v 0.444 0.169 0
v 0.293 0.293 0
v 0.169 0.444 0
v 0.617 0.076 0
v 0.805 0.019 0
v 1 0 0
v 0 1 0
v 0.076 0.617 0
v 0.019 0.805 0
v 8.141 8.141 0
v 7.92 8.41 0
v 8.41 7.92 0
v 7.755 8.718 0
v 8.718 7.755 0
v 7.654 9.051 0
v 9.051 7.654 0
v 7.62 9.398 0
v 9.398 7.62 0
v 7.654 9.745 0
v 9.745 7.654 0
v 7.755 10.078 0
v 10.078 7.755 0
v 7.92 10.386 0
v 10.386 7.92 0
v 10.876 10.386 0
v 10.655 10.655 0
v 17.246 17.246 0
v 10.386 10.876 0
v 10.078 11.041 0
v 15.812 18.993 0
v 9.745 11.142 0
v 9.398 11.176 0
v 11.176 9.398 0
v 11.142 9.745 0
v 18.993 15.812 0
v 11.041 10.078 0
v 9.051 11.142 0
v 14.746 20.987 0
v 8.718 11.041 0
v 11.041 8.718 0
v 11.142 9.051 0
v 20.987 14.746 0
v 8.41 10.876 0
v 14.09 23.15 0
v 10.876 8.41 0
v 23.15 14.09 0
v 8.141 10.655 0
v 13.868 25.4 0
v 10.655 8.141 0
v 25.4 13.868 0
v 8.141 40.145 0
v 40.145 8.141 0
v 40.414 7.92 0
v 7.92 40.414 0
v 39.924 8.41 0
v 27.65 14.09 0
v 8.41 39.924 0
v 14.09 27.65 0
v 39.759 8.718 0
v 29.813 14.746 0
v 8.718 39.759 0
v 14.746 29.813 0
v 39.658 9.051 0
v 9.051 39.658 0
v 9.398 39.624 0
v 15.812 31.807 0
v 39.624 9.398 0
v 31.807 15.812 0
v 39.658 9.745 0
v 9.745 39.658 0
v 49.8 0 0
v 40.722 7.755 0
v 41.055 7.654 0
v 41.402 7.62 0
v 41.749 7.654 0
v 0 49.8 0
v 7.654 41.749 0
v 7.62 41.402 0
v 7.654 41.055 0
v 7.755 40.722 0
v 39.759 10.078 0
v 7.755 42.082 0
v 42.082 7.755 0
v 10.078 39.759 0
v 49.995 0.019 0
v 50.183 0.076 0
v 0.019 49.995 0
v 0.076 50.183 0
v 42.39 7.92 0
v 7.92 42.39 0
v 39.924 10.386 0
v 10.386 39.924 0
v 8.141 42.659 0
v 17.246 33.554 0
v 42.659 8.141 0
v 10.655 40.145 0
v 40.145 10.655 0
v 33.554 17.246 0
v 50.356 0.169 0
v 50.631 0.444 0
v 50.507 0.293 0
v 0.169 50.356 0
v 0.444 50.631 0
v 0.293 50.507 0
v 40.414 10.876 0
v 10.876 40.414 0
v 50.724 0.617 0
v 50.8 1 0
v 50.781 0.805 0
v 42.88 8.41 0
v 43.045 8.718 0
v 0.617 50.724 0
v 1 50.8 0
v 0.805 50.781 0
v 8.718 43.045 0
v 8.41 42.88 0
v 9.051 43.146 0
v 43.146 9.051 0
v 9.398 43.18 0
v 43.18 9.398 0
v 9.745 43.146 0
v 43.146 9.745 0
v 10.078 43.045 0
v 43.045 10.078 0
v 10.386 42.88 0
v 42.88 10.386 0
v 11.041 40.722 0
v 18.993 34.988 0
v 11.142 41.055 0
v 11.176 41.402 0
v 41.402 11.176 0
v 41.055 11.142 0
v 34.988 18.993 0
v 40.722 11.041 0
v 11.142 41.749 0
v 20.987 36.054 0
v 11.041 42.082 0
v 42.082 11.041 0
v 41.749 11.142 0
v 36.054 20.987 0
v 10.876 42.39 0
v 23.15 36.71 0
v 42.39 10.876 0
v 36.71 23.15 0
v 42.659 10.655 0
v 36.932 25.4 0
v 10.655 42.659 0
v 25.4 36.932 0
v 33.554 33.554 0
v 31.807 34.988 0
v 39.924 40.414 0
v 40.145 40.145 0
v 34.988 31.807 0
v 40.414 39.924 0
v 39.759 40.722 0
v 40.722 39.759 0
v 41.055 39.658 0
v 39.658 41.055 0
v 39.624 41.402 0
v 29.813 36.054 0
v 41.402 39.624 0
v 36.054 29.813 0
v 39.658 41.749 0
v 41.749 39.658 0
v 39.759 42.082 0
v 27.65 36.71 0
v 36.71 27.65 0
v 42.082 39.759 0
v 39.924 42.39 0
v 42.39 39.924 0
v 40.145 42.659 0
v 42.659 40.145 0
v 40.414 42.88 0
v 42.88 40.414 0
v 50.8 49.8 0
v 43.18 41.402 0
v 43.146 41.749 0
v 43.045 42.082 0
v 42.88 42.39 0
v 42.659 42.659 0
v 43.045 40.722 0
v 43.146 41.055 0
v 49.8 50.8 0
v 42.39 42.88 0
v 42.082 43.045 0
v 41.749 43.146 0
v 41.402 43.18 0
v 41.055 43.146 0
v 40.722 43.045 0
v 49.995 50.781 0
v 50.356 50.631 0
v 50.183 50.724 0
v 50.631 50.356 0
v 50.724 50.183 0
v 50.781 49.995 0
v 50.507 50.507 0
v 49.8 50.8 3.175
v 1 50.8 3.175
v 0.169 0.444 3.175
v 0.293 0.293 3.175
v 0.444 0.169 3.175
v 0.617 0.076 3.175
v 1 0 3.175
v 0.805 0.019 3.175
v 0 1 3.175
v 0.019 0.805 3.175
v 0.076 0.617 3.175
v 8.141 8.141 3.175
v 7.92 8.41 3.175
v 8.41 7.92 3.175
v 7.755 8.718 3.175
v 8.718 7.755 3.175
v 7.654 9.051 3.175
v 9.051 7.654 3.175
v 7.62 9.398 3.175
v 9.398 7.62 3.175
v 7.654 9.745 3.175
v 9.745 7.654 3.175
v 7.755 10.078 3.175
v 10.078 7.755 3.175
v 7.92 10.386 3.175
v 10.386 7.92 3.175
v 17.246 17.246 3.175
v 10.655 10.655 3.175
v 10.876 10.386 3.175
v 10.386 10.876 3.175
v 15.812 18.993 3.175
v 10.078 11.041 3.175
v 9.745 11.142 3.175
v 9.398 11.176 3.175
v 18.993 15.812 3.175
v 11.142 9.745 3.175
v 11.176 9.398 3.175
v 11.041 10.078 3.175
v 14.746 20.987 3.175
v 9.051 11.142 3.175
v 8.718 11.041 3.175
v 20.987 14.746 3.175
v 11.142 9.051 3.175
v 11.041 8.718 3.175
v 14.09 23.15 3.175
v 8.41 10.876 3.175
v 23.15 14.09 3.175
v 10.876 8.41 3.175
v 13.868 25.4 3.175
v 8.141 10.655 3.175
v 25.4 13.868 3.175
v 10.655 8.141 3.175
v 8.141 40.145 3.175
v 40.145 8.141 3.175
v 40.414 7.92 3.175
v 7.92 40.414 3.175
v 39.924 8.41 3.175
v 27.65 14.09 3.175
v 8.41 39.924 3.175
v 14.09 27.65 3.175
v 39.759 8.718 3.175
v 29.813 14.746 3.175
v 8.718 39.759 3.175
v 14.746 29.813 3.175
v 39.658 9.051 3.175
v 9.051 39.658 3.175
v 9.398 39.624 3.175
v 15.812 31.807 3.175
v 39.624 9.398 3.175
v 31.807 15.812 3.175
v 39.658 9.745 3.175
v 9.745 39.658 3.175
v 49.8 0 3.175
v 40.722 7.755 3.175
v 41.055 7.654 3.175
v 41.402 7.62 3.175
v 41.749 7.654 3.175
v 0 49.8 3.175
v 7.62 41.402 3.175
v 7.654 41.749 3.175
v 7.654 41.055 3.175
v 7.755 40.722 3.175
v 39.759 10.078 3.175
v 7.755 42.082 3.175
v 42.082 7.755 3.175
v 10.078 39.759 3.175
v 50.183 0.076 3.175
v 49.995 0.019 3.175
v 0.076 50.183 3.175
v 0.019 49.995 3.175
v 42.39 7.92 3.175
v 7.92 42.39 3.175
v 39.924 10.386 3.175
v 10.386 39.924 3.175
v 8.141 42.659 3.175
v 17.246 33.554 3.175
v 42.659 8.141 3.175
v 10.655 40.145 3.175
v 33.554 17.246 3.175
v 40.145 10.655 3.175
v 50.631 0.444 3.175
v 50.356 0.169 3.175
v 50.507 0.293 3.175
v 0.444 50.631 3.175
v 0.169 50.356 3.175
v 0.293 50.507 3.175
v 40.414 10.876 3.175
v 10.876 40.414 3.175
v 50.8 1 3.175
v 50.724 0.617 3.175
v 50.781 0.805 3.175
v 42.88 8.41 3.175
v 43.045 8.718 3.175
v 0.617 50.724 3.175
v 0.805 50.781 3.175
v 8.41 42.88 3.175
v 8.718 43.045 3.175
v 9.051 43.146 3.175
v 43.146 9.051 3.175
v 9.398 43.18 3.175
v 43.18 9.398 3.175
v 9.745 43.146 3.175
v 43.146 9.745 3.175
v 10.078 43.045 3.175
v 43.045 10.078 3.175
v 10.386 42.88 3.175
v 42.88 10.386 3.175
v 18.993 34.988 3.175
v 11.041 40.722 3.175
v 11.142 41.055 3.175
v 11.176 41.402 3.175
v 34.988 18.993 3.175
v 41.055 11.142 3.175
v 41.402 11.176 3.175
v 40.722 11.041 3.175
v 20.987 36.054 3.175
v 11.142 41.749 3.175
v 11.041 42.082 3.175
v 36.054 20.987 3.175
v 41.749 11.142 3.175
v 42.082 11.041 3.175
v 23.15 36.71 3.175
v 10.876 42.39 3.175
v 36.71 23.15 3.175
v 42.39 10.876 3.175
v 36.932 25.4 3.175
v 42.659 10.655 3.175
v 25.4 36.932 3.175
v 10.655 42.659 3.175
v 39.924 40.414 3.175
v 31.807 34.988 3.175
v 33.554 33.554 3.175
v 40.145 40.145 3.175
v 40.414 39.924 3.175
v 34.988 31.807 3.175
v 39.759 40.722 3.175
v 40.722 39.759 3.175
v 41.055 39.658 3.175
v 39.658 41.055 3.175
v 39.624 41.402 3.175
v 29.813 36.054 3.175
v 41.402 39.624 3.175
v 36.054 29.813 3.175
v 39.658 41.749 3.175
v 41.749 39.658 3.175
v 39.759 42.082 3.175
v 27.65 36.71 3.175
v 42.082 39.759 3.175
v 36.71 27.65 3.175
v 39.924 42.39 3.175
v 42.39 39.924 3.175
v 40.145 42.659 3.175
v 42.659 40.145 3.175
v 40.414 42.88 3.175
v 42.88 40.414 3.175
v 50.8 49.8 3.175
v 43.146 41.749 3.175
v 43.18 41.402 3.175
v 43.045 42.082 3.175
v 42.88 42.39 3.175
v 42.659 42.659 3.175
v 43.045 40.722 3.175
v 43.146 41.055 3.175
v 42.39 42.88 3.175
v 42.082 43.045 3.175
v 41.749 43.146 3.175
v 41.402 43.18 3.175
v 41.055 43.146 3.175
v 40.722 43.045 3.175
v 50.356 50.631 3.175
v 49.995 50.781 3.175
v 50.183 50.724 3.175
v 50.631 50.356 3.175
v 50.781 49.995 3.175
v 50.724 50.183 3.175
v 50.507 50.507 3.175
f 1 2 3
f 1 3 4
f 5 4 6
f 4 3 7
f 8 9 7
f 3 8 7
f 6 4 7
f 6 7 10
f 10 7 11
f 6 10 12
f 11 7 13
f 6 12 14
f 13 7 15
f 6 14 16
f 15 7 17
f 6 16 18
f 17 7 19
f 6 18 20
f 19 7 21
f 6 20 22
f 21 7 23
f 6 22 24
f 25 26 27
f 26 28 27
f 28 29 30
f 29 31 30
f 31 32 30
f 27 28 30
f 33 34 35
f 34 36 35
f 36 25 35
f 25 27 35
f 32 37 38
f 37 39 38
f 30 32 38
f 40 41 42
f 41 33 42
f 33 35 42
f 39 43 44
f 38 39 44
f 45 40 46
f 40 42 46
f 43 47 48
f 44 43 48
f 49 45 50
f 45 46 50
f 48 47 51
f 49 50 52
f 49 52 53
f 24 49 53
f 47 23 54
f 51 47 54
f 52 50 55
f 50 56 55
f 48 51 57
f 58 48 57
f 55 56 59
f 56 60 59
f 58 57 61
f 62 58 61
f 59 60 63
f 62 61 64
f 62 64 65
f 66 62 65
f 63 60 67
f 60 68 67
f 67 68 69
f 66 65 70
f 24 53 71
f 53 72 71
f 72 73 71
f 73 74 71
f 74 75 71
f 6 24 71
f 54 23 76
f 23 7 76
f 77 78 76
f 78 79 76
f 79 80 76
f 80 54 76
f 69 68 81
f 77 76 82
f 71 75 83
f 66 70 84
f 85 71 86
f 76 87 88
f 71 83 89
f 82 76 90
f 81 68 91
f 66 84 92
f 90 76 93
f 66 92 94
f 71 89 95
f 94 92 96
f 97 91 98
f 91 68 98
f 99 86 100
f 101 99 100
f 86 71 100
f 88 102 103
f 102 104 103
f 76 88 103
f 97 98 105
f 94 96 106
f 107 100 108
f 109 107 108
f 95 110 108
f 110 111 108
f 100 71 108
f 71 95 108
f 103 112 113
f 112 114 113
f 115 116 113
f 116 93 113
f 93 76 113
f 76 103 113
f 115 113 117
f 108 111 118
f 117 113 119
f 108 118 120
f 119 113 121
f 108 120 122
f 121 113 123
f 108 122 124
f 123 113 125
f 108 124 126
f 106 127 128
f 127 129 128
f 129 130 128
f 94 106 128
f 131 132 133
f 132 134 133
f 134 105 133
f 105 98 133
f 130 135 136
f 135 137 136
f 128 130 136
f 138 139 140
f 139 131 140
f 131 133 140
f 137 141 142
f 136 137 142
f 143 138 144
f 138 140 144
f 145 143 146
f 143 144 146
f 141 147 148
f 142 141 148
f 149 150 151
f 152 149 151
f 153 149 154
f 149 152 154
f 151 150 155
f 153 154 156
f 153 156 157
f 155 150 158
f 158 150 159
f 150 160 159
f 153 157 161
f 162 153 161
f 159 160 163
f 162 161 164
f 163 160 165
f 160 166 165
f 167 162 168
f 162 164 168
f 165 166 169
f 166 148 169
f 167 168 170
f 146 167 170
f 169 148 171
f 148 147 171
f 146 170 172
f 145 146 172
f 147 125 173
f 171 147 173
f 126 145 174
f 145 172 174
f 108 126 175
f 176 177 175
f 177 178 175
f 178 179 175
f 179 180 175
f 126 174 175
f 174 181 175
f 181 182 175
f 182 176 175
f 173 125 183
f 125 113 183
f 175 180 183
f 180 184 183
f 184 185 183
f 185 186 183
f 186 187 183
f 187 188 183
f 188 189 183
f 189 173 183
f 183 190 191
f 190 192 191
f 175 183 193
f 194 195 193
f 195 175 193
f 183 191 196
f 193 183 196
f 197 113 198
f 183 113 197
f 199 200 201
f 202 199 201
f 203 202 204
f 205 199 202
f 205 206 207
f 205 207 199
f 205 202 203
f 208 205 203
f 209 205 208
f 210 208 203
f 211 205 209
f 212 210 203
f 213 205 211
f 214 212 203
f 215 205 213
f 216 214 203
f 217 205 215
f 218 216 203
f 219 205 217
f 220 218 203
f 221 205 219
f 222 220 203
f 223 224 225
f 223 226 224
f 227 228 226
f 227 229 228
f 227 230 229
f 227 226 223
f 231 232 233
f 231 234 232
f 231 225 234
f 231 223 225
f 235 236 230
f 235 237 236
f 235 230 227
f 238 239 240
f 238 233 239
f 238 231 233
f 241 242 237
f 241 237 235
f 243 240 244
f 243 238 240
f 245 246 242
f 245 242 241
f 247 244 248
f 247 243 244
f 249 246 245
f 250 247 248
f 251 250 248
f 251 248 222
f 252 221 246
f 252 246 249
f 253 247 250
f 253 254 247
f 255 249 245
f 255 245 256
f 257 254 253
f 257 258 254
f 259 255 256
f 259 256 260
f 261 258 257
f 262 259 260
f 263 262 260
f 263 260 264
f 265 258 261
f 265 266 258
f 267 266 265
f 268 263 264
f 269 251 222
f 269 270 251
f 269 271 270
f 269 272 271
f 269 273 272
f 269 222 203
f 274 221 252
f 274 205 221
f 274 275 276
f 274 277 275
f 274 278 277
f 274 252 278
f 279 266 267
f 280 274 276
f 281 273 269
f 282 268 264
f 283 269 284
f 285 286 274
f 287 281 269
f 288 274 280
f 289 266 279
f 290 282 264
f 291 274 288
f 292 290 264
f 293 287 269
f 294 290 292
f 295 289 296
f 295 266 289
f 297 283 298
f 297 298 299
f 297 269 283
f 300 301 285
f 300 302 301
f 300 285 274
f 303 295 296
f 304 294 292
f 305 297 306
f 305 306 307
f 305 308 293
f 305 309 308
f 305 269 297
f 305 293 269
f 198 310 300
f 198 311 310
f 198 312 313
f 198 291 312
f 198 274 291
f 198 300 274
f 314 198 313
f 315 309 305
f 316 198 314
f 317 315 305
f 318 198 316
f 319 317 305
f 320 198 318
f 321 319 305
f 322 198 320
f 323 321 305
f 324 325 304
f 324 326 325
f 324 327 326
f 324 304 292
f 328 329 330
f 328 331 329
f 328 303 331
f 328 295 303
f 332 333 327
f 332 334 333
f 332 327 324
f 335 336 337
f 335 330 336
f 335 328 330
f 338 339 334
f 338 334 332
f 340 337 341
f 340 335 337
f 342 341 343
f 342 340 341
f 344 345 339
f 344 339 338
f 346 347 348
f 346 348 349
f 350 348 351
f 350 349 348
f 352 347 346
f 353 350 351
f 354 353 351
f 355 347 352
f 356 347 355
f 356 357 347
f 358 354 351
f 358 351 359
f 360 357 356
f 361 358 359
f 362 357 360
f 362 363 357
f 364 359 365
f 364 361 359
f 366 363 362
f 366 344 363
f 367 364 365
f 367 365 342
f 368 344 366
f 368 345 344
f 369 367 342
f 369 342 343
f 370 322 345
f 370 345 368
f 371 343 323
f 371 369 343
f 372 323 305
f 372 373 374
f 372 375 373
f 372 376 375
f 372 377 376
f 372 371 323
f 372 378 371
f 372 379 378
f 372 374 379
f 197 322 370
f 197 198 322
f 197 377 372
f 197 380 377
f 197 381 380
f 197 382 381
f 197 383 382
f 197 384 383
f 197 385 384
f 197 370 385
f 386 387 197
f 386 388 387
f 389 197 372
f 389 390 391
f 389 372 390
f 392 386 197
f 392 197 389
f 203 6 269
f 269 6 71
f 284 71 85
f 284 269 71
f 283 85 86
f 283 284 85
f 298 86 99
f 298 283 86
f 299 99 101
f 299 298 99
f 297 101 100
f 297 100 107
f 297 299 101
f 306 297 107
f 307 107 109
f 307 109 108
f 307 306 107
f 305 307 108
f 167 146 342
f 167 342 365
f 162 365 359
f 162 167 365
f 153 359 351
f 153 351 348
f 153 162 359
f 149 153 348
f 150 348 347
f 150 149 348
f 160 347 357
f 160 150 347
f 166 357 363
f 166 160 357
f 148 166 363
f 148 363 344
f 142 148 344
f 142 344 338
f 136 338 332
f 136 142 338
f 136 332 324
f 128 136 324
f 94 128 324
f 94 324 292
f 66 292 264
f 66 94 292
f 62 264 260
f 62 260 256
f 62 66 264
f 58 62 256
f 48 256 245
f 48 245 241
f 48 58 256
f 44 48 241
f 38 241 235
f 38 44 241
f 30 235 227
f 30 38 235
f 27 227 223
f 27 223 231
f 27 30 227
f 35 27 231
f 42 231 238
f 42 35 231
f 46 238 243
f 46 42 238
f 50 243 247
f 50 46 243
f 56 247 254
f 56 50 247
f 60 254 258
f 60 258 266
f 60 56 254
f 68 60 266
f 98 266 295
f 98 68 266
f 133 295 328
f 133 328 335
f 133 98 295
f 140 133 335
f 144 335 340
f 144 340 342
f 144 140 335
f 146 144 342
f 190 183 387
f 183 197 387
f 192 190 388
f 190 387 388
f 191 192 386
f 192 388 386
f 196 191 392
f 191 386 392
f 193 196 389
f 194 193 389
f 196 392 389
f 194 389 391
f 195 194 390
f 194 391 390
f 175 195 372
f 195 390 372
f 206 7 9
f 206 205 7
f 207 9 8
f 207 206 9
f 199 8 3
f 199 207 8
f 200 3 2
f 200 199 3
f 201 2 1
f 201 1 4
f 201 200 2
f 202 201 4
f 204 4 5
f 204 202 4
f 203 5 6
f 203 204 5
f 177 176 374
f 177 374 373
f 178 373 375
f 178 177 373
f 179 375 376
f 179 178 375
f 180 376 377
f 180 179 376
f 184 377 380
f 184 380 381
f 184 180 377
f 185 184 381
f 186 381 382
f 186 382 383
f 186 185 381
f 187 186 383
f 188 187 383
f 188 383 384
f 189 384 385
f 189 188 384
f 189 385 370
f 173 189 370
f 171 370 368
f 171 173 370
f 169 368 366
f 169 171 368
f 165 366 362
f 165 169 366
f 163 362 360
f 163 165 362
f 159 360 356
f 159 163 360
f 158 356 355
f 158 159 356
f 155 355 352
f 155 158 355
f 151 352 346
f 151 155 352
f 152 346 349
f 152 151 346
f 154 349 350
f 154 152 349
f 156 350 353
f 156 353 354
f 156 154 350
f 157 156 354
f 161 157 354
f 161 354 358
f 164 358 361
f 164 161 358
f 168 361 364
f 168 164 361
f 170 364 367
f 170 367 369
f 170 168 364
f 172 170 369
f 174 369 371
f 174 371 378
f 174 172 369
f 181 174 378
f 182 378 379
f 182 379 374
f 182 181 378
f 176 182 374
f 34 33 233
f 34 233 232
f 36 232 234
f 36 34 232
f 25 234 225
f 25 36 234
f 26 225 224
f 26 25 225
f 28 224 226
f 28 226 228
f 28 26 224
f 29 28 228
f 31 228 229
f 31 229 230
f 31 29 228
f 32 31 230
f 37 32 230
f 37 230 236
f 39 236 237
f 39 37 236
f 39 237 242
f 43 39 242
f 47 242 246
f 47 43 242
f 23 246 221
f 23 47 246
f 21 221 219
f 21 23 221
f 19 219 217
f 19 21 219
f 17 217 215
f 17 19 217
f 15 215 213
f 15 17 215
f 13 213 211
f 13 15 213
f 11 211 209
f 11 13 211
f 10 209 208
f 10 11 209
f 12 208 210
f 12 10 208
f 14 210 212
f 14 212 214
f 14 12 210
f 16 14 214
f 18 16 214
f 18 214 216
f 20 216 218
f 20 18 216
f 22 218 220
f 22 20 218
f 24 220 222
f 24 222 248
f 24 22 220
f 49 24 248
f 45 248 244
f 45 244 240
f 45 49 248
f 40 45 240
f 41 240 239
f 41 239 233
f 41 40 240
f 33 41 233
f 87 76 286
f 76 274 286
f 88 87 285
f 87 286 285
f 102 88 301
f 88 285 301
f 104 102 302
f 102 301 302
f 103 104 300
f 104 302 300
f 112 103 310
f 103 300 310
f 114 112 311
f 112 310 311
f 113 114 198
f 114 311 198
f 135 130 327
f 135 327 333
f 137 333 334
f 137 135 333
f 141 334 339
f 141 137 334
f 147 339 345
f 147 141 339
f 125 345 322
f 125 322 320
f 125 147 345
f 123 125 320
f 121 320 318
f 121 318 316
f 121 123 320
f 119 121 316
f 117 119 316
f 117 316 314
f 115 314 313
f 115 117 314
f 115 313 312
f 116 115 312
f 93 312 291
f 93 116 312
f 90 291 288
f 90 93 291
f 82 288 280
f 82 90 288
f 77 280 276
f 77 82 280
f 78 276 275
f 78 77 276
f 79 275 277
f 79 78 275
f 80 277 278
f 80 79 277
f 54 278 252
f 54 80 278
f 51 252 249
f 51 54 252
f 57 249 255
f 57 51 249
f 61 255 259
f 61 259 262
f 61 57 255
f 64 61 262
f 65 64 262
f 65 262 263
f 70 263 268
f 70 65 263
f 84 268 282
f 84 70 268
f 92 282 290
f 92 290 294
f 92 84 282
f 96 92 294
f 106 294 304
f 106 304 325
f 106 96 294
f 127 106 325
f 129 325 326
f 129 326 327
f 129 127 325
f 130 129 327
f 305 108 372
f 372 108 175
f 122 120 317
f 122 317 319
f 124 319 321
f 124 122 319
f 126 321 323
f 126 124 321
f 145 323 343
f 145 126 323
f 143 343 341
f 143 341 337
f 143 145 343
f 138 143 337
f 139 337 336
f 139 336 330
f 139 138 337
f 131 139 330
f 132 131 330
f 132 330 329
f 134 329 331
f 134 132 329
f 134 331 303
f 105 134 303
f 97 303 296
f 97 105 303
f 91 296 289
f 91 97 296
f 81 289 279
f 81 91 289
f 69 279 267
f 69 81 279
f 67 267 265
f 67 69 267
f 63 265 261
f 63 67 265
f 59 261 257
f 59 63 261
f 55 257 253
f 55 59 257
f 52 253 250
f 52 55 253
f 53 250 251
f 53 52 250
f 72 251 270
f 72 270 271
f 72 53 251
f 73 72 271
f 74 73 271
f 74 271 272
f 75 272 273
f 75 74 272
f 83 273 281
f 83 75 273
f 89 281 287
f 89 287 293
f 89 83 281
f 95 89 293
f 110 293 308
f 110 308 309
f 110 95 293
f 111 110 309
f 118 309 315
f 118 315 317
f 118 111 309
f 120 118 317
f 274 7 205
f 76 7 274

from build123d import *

# Parameters (mm, degrees)
F0_W     = 50.8
F0_H     = 50.8
F0_R     = 1.778
F0_R_2   = 11.5316
F1_DEPTH = 3.175
F2_R     = 1


with BuildPart() as f1:
    # F0 (on Top) → F1 (new body)
    with BuildSketch(Plane.XY):
        with Locations((25.4, 25.4)):
            Rectangle(F0_W, F0_H)
        with Locations((9.398, 9.398)):
            Circle(F0_R, mode=Mode.SUBTRACT)
        with Locations((25.4, 25.4)):
            Circle(F0_R_2, mode=Mode.SUBTRACT)
        with Locations((41.402, 9.398)):
            Circle(F0_R, mode=Mode.SUBTRACT)
        with Locations((9.398, 41.402)):
            Circle(F0_R, mode=Mode.SUBTRACT)
        with Locations((41.402, 41.402)):
            Circle(F0_R, mode=Mode.SUBTRACT)
    extrude(amount=F1_DEPTH)

    # F2
    f2_edges = [f1.edges().sort_by_distance(p)[0] for p in [
        (50.8, 0, 1.5875),
        (50.8, 50.8, 1.5875),
        (0, 50.8, 1.5875),
        (0, 0, 1.5875),
    ]]
    fillet(f2_edges, radius=F2_R)


solid = f1.part
